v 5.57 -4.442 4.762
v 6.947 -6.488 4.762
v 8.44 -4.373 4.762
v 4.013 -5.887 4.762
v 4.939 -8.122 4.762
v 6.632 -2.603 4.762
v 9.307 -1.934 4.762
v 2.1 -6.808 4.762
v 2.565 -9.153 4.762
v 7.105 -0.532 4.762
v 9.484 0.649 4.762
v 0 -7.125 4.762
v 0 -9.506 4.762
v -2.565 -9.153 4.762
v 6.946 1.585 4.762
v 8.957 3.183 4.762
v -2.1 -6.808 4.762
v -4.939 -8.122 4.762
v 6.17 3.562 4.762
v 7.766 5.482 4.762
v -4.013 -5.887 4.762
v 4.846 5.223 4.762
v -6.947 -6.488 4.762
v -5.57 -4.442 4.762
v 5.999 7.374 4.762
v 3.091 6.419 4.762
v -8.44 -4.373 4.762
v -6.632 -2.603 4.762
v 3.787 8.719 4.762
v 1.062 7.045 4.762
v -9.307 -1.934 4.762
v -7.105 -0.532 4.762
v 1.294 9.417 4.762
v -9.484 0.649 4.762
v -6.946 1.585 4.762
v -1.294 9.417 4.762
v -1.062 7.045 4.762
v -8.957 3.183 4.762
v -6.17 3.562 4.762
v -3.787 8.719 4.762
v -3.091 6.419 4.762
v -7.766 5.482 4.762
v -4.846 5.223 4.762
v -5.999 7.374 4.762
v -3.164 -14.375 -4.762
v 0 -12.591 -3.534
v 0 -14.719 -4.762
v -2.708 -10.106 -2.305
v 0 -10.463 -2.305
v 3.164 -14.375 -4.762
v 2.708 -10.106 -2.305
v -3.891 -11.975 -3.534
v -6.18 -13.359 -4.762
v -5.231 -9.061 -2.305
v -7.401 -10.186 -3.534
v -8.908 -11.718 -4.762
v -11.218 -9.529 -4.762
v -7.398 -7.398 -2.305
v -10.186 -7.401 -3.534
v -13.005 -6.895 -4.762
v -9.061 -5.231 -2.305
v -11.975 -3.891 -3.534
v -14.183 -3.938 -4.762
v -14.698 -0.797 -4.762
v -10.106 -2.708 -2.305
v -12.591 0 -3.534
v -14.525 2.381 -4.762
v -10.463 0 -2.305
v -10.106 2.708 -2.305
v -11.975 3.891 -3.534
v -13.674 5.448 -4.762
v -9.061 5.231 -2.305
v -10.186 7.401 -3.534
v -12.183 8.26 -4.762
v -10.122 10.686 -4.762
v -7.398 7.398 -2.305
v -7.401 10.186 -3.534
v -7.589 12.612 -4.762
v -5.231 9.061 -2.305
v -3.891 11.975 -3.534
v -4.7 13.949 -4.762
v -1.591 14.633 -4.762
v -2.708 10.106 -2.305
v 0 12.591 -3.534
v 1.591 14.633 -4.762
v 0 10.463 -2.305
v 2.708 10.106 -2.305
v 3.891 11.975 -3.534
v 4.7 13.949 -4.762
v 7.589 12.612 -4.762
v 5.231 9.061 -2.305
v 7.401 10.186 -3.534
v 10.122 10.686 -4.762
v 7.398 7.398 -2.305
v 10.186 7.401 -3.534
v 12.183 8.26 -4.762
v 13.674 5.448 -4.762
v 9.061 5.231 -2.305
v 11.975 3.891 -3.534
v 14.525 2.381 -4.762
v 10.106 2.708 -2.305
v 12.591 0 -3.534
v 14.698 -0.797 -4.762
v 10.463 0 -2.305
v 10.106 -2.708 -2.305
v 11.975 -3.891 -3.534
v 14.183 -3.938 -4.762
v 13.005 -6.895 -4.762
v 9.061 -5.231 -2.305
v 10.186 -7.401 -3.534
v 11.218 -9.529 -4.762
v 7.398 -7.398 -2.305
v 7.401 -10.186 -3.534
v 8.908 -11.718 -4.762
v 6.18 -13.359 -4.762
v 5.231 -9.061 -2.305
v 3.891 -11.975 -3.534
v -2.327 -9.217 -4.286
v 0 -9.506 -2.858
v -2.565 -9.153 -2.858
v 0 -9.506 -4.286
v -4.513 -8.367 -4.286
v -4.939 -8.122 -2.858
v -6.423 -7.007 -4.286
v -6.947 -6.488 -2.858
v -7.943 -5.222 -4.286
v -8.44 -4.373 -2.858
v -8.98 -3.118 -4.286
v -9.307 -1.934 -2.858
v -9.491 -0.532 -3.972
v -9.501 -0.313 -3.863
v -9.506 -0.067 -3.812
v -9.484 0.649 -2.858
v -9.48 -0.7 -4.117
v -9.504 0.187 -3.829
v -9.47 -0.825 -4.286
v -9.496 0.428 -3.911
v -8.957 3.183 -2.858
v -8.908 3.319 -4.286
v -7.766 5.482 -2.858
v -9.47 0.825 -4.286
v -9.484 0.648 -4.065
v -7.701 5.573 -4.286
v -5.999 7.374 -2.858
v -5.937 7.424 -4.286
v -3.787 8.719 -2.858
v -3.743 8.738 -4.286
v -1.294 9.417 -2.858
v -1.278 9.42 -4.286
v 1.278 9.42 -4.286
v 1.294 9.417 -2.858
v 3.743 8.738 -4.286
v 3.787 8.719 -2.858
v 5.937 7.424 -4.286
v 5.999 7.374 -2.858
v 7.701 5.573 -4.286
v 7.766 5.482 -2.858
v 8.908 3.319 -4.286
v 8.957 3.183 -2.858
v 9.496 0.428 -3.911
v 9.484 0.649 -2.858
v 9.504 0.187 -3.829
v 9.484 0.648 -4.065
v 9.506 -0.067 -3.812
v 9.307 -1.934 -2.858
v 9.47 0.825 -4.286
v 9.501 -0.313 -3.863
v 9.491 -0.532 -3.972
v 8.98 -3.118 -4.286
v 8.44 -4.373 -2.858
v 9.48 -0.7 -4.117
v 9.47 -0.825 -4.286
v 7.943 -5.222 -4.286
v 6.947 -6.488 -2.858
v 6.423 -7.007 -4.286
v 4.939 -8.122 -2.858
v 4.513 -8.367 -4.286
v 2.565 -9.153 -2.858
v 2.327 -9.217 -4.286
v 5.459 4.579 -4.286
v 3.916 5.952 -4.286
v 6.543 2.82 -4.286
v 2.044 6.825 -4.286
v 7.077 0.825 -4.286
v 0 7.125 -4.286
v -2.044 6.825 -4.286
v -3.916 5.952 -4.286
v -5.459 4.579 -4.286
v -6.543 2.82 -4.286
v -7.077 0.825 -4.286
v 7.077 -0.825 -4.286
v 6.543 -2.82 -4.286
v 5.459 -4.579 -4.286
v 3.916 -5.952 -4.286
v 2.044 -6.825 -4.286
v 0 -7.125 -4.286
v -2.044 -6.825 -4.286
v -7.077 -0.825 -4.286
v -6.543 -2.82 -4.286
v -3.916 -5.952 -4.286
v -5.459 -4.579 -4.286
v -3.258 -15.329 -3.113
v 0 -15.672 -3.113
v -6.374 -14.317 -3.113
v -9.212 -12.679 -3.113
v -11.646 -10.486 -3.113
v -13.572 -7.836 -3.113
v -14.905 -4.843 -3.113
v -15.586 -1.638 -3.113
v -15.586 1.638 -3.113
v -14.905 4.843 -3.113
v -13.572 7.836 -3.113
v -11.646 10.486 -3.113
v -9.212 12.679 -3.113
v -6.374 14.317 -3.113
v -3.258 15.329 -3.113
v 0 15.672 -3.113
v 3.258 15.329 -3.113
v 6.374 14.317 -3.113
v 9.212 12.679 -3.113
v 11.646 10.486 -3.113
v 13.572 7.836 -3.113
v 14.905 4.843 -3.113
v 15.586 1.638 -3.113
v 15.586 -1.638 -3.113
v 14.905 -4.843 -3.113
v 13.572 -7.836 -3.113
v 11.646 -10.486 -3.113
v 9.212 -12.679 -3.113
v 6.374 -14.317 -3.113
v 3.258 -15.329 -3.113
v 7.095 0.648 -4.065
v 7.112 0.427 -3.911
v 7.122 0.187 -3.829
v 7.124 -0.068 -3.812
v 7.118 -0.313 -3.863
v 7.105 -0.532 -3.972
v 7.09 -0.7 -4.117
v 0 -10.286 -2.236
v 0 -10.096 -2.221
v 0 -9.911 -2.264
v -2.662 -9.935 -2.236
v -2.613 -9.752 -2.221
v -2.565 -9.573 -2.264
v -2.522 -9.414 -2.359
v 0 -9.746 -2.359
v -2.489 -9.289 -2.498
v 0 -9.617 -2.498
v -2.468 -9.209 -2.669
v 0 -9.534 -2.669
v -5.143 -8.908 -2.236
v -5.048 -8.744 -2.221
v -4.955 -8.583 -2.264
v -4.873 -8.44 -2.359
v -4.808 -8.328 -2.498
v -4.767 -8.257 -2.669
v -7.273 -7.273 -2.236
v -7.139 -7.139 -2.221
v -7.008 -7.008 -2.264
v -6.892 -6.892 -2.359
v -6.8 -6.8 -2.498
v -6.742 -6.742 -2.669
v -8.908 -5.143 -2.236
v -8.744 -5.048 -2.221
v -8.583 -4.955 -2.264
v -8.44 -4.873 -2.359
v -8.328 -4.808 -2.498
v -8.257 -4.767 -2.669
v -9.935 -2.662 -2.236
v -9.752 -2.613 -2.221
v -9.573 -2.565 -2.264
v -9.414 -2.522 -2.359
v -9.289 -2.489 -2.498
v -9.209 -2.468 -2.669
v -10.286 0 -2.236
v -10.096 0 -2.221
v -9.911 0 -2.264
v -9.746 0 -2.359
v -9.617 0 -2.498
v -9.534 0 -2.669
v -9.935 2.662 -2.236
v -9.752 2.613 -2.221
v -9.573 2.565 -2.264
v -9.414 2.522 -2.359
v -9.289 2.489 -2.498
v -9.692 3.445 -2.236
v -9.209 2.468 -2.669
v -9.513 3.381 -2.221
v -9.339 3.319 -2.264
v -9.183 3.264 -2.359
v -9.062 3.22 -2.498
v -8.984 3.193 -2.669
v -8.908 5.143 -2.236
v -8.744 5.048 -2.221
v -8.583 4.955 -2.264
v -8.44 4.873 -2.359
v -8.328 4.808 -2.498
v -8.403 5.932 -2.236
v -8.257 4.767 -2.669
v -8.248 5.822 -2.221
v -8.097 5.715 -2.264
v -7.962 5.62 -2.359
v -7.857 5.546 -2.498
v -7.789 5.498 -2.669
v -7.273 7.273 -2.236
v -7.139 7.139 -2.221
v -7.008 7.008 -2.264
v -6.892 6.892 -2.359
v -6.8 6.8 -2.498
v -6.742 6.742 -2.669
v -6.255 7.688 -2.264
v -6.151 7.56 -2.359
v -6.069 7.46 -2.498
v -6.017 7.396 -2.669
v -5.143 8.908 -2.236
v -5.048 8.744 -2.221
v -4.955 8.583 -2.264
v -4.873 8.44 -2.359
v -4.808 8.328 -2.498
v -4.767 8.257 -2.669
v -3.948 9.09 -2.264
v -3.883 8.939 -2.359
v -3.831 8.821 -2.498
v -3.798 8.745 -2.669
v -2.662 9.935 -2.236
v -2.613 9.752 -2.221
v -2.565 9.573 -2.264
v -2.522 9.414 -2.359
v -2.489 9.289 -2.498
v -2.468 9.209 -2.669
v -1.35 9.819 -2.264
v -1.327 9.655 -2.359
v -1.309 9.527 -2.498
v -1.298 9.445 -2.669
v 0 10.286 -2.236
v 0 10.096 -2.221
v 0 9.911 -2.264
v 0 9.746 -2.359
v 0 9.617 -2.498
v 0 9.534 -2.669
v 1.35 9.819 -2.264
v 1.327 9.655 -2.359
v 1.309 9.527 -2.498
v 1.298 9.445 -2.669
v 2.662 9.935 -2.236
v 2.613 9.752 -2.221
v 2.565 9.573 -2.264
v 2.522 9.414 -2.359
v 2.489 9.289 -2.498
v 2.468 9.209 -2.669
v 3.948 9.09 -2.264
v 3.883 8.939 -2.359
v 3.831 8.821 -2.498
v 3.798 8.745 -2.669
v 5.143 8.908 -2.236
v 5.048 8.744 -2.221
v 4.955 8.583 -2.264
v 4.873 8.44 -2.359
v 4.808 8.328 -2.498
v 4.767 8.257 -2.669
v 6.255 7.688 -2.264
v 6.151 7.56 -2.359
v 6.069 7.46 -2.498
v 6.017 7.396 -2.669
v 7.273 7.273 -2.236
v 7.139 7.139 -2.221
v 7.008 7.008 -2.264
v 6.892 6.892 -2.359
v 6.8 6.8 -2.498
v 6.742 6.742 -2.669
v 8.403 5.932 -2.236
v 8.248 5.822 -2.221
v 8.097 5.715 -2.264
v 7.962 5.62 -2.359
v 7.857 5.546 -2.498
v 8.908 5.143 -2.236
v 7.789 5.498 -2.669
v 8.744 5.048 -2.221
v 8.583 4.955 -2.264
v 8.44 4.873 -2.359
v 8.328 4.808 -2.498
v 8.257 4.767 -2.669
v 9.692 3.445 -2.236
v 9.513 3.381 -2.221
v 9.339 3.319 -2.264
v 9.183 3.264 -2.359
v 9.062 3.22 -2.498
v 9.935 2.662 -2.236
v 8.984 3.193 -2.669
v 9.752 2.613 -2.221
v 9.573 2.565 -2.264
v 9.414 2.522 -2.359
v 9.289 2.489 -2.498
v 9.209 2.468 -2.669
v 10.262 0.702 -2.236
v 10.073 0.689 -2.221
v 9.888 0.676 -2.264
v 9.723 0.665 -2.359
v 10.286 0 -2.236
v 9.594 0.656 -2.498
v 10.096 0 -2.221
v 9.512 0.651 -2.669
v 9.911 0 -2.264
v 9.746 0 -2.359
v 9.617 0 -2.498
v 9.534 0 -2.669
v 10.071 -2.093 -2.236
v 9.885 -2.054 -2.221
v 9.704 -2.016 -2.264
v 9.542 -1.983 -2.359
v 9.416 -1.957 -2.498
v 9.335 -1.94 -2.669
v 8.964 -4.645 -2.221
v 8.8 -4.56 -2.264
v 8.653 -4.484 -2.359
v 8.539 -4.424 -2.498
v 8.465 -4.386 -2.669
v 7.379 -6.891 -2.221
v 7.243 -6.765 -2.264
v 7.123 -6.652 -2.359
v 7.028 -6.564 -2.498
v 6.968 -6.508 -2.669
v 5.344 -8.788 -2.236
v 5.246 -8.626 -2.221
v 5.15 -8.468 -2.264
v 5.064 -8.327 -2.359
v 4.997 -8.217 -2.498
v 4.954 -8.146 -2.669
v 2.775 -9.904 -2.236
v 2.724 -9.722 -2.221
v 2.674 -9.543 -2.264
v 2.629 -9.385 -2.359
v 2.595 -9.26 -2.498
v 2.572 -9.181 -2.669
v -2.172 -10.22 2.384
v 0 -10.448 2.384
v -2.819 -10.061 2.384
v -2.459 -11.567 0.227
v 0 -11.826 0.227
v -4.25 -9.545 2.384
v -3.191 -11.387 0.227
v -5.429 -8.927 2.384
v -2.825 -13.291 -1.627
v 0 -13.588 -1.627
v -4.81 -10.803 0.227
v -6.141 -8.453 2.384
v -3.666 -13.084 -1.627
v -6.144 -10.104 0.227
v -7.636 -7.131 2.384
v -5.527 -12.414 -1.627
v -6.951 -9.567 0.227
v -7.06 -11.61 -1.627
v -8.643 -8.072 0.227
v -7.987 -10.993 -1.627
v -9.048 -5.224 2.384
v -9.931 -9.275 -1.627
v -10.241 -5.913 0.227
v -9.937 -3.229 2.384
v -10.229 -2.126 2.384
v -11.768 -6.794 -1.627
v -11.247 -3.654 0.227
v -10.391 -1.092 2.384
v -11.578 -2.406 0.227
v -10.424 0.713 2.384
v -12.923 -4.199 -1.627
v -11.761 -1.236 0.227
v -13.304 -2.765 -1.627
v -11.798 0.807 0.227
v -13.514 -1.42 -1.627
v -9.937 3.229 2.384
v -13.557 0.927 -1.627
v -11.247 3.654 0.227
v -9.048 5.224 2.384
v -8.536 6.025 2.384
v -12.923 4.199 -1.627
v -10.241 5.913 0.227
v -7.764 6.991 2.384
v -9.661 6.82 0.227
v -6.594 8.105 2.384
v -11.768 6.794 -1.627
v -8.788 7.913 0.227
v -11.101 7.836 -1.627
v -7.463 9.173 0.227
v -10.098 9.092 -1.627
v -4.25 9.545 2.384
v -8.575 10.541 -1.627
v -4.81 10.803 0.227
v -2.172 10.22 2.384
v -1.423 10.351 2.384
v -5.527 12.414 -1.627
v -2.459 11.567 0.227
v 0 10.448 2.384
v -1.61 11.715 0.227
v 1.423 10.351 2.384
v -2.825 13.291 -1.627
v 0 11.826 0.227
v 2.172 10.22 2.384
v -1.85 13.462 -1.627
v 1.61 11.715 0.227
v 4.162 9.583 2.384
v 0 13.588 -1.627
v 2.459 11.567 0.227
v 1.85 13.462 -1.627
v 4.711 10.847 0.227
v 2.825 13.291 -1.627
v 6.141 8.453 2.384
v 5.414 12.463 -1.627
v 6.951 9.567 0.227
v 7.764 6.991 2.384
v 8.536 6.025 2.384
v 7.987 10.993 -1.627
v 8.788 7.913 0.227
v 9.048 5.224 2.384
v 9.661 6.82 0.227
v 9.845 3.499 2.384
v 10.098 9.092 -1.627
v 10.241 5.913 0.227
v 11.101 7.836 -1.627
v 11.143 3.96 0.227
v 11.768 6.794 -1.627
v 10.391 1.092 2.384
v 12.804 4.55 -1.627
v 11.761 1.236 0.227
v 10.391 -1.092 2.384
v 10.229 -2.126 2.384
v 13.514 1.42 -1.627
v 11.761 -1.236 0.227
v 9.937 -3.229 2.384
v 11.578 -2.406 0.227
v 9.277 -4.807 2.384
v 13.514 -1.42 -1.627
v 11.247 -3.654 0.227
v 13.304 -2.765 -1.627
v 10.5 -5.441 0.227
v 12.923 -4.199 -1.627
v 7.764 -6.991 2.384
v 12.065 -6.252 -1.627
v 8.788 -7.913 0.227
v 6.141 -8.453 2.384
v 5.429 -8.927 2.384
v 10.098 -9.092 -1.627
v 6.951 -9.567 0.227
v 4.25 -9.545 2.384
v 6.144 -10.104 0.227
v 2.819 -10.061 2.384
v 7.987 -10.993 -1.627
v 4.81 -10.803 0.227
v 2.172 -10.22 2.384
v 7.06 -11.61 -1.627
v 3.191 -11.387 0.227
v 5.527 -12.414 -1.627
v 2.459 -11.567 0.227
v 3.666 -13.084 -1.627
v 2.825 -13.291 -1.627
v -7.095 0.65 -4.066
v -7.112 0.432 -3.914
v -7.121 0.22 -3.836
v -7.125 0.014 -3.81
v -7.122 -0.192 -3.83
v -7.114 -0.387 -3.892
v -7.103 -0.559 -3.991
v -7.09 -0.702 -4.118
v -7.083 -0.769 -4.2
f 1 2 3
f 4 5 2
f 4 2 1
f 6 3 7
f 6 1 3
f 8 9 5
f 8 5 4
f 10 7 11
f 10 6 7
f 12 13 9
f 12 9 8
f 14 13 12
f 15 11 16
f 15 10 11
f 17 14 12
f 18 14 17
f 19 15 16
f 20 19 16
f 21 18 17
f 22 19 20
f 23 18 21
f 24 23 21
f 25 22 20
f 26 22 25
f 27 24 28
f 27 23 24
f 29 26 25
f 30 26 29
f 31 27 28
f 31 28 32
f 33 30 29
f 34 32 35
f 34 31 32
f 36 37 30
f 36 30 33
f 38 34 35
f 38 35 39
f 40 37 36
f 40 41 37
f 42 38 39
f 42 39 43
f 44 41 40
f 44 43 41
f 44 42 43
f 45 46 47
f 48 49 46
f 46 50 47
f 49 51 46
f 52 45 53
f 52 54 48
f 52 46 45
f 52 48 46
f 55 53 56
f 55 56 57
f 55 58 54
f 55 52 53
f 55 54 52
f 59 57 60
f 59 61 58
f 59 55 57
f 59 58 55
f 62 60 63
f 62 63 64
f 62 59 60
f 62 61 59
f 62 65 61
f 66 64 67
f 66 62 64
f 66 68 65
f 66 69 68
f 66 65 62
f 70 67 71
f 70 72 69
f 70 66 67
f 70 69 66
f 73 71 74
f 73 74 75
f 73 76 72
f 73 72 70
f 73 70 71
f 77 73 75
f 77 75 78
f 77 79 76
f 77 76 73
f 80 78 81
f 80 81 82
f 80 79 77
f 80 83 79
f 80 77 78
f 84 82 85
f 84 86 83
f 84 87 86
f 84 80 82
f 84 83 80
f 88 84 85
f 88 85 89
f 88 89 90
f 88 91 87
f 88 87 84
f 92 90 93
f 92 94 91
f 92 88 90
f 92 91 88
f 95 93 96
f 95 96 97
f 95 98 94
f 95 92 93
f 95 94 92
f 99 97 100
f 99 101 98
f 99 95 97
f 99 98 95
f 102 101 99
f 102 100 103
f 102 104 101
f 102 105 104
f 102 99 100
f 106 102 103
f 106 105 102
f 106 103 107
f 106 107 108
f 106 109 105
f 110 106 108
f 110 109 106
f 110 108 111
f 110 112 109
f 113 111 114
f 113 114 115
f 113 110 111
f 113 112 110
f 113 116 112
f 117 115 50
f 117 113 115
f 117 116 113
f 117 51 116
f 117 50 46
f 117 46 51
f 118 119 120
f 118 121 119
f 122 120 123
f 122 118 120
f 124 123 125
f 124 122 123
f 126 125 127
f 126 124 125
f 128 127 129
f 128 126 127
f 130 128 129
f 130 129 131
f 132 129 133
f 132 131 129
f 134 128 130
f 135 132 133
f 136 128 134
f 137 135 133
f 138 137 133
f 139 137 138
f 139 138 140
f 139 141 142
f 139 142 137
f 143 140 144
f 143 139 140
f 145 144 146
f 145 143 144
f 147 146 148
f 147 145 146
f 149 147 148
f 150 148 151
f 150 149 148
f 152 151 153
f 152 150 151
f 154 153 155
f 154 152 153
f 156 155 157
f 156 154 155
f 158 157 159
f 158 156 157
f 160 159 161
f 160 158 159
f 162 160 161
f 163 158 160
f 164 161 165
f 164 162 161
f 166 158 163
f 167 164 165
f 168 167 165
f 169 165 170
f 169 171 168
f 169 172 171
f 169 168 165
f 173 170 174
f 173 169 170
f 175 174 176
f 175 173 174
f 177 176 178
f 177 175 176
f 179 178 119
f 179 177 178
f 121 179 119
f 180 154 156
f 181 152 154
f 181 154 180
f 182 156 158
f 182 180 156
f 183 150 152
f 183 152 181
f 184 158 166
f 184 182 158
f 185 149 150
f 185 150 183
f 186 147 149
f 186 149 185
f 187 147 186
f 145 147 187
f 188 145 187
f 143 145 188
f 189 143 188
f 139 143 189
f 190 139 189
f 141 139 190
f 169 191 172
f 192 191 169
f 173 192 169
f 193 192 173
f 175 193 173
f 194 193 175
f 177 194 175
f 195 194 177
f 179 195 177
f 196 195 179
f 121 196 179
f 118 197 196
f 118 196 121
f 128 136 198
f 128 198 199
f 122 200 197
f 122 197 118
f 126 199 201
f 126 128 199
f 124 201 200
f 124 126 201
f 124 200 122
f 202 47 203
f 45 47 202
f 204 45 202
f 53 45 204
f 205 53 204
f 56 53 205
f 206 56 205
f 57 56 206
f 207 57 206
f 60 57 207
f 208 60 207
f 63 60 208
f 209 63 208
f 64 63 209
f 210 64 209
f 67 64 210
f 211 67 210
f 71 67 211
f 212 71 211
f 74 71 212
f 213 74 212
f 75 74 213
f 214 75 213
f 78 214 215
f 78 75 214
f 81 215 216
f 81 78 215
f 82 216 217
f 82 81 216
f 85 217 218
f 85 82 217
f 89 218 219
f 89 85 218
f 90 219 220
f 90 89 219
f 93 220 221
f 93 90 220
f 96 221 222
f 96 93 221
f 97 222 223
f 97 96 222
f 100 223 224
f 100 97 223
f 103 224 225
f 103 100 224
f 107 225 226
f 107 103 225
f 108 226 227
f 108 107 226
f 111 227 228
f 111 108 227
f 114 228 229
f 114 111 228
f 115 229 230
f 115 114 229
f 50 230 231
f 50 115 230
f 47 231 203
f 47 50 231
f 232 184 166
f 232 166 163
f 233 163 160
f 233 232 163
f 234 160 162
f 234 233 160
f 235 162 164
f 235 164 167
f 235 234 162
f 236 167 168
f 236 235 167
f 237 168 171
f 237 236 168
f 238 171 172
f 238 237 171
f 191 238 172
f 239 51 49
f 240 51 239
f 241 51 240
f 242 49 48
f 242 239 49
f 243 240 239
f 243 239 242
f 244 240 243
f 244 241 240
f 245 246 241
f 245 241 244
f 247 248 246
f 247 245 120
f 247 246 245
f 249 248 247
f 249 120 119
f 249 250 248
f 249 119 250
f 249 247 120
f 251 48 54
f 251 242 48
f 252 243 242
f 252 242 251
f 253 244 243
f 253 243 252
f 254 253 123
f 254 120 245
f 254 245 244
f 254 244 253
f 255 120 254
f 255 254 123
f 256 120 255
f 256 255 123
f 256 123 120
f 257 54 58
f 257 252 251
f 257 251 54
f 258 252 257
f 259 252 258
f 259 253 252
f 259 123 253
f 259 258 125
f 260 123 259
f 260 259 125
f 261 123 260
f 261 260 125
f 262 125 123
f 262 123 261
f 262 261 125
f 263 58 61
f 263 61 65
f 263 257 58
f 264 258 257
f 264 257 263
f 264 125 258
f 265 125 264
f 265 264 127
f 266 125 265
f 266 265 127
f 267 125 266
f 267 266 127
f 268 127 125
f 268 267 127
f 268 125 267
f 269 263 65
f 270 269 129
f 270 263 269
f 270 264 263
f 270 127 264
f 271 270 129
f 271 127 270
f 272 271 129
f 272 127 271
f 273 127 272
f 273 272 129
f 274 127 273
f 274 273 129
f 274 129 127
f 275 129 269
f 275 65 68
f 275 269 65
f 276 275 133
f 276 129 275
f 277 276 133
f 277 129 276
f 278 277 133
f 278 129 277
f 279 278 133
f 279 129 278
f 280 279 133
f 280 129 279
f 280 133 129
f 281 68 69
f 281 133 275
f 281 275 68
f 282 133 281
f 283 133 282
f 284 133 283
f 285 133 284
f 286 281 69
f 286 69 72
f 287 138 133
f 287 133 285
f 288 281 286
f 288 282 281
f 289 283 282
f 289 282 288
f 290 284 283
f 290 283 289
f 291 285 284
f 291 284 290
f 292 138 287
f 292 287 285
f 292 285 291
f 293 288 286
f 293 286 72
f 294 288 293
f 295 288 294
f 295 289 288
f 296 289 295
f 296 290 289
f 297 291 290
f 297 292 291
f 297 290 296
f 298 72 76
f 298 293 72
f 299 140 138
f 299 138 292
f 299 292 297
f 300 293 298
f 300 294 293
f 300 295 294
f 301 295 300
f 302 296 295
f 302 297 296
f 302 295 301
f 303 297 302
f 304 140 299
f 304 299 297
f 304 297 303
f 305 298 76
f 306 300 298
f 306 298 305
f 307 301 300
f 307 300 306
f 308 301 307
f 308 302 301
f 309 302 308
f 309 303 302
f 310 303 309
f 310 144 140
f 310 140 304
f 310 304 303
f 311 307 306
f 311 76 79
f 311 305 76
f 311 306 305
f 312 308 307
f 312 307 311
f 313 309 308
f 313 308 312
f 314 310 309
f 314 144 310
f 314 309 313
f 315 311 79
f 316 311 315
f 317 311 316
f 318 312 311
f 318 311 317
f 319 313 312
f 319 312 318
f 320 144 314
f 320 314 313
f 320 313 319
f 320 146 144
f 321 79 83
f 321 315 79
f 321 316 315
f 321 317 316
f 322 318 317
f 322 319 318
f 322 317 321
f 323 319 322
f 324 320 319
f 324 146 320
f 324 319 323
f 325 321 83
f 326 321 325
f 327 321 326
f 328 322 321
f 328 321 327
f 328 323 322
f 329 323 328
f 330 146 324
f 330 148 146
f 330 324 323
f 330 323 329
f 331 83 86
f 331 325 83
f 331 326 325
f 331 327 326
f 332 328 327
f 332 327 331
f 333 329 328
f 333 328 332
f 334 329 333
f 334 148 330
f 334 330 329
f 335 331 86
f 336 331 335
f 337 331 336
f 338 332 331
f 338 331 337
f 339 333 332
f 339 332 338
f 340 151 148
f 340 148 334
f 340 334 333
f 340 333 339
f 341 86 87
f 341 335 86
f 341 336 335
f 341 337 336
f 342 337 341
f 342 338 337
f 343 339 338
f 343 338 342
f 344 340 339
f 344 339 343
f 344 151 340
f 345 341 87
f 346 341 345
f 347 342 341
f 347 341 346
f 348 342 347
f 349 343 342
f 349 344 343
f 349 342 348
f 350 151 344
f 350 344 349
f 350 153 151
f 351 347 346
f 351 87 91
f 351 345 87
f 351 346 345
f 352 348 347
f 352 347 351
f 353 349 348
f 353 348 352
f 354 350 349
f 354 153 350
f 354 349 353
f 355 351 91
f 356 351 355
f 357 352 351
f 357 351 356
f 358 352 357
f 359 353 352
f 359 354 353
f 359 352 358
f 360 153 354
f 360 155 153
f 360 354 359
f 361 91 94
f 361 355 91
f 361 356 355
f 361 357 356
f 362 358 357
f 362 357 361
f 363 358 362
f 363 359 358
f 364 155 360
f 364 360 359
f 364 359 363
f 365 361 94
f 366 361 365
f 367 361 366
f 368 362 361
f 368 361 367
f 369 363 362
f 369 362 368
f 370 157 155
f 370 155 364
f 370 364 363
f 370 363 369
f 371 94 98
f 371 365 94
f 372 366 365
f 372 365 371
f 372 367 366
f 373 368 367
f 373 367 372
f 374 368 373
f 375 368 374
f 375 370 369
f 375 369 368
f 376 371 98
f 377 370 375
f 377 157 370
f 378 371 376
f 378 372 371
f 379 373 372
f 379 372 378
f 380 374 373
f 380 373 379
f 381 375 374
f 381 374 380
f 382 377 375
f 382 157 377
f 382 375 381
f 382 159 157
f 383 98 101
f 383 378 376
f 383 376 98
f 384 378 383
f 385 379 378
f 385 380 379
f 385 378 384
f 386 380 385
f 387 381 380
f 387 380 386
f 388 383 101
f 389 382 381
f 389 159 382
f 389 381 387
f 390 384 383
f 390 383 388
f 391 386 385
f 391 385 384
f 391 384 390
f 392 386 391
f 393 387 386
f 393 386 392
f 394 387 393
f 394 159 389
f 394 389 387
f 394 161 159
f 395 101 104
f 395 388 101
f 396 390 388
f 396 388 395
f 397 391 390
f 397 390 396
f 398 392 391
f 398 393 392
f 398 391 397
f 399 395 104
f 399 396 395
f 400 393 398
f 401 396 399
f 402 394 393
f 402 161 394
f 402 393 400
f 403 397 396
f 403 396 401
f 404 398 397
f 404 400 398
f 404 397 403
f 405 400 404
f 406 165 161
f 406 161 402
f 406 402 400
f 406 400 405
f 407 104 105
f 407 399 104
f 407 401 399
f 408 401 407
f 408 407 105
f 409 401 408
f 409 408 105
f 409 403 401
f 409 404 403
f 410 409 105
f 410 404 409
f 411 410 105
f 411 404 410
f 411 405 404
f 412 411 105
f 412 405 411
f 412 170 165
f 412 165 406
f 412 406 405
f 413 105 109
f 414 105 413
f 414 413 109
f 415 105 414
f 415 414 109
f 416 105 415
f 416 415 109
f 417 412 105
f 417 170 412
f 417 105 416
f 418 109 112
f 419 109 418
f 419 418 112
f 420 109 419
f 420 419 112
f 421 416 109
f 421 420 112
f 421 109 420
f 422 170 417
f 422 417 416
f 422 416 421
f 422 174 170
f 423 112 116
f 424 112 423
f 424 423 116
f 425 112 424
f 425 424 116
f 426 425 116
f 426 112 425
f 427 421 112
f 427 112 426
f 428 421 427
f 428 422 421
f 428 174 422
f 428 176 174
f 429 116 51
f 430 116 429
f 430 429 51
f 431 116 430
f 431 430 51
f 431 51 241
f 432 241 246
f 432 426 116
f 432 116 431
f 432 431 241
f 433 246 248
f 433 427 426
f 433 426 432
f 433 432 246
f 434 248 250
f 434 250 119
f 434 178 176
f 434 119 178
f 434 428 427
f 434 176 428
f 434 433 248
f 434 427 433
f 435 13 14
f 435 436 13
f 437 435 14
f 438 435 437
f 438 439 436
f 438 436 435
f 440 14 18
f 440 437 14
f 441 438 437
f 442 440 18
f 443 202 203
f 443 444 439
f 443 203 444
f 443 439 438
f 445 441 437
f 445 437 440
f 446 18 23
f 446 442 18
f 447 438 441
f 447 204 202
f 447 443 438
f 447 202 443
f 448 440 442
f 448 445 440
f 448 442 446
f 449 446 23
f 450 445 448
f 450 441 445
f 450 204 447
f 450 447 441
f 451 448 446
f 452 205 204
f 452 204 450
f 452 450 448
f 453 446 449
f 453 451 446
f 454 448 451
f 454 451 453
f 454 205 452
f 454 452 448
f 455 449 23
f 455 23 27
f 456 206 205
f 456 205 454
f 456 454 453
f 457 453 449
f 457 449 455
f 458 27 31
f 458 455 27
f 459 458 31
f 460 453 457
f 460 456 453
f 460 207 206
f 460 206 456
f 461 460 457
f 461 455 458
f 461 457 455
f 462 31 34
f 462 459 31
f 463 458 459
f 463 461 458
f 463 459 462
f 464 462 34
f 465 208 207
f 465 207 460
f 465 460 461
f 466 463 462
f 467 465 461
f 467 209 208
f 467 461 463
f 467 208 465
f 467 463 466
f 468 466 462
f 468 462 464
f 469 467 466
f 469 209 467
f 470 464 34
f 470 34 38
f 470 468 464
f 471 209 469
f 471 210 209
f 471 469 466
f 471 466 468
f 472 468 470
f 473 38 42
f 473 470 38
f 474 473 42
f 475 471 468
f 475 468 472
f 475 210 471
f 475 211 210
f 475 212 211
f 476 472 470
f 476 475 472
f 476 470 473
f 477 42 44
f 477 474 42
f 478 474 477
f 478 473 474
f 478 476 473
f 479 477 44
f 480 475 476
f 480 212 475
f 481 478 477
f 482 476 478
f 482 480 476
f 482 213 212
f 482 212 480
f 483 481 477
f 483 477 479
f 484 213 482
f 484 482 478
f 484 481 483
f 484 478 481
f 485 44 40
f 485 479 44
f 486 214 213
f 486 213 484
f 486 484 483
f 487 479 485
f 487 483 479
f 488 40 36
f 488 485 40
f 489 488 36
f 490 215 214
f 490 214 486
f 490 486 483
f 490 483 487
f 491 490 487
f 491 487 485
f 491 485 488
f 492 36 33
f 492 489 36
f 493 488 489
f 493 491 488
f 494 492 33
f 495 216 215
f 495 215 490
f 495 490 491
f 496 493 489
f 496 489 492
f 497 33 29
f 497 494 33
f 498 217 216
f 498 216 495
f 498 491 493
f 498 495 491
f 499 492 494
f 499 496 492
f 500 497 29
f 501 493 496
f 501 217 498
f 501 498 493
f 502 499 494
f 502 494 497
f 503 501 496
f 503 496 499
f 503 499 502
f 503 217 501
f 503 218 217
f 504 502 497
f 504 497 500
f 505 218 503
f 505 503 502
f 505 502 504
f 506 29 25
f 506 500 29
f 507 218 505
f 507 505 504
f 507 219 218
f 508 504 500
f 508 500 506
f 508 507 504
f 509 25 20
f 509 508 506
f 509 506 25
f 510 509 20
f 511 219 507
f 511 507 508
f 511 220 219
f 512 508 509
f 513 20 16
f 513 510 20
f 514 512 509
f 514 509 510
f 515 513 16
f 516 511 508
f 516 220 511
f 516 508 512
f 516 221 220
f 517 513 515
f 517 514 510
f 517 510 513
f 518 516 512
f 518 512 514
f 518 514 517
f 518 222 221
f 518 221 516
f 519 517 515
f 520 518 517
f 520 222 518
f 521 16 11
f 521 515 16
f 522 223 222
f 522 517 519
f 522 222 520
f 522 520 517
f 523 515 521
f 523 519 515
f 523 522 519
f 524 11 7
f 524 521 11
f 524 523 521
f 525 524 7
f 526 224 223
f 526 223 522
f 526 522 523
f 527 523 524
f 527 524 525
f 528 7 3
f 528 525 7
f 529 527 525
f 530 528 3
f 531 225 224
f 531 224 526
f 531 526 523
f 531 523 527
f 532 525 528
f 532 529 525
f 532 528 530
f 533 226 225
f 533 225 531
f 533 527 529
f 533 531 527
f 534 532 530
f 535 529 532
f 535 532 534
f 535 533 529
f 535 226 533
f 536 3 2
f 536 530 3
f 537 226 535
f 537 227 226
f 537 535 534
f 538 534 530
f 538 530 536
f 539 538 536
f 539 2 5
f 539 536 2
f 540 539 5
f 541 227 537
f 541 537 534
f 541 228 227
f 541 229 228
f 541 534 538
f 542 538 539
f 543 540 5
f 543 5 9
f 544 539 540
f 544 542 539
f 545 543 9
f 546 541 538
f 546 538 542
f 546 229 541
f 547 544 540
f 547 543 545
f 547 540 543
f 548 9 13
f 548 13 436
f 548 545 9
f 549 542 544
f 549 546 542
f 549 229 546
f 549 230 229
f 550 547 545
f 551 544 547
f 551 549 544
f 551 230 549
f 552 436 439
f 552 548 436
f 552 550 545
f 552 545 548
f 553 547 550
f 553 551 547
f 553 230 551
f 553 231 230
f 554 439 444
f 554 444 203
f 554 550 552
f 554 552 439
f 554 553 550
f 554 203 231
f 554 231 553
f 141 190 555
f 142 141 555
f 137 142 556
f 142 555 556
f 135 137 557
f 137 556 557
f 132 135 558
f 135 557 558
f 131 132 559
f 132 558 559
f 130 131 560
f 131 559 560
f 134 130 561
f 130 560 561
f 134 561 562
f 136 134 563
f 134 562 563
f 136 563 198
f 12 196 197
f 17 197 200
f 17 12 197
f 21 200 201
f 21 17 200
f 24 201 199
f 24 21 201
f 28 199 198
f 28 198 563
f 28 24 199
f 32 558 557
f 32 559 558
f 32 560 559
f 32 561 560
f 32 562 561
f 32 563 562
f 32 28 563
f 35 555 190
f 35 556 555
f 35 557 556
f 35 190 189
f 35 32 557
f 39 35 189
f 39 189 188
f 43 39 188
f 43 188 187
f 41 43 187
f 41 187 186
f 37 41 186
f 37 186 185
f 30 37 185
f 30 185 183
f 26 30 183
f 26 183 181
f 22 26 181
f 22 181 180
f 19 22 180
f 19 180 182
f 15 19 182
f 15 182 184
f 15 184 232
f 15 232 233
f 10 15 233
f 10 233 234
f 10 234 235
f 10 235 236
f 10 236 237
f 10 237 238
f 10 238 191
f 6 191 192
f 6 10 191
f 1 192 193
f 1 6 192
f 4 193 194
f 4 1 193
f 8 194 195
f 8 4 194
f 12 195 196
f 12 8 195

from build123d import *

# Parameters (mm, degrees)
CUT_EXTRUDE1_REACH             = 24.669
SKETCH2_R                      = 0.9525
CUT_EXTRUDE1_DIRECTION_2_REACH = 24.669


with BuildPart() as part:
    # Sketch3 → Revolve1 (revolve)
    with BuildSketch(Plane(origin=(0, 0, 0), x_dir=(0, 0, -1), z_dir=(1, 0, 0)), mode=Mode.PRIVATE) as revolve1_sk:
        with BuildLine():
            Line((-4.7625, 7.1247), (-4.7625, 9.50595))
            ThreePointArc((-4.7625, 9.50595), (-0.2272742, 11.825581937), (3.112721606, 15.6718))
            Line((3.112721606, 15.6718), (4.7625, 14.7193))
            Line((4.7625, 14.7193), (2.305035487, 10.462846606))
            ThreePointArc((2.305035487, 10.462846606), (2.305035487, 9.824915535), (2.8575, 9.50595))
            Line((2.8575, 9.50595), (4.28625, 9.50595))
            Line((4.28625, 9.50595), (4.28625, 7.1247))
            Line((4.28625, 7.1247), (-4.7625, 7.1247))
        make_face()
    revolve(revolve1_sk.sketch.rotate(Axis((0, 0, 4.7625), (0, 0, -1)), 180), axis=Axis((0, 0, 4.7625), (0, 0, -1)))

    # Sketch2 → Cut-Extrude1 (cut, up to next)
    with BuildSketch(Plane(origin=(0, 0, 0), x_dir=(0, 0, -1), z_dir=(1, 0, 0)), mode=Mode.PRIVATE) as cut_extrude1_sk1:
        with Locations((4.7625, 0)):
            Circle(SKETCH2_R)
    cut_extrude1_tool1 = extrude(cut_extrude1_sk1.sketch, amount=-CUT_EXTRUDE1_REACH, mode=Mode.PRIVATE) & part.part
    add(cut_extrude1_tool1.solids().sort_by_distance((0, 0, -4.7625))[0], mode=Mode.SUBTRACT)

    # Sketch2 → Cut-Extrude1 direction 2 (cut, up to next)
    with BuildSketch(Plane(origin=(0, 0, 0), x_dir=(0, 0, -1), z_dir=(1, 0, 0)), mode=Mode.PRIVATE) as cut_extrude1_direction_2_sk1:
        with Locations((4.7625, 0)):
            Circle(SKETCH2_R)
    cut_extrude1_direction_2_tool1 = extrude(cut_extrude1_direction_2_sk1.sketch, amount=CUT_EXTRUDE1_DIRECTION_2_REACH, mode=Mode.PRIVATE) & part.part
    add(cut_extrude1_direction_2_tool1.solids().sort_by_distance((0, 0, -4.7625))[0], mode=Mode.SUBTRACT)


solid = part.part
